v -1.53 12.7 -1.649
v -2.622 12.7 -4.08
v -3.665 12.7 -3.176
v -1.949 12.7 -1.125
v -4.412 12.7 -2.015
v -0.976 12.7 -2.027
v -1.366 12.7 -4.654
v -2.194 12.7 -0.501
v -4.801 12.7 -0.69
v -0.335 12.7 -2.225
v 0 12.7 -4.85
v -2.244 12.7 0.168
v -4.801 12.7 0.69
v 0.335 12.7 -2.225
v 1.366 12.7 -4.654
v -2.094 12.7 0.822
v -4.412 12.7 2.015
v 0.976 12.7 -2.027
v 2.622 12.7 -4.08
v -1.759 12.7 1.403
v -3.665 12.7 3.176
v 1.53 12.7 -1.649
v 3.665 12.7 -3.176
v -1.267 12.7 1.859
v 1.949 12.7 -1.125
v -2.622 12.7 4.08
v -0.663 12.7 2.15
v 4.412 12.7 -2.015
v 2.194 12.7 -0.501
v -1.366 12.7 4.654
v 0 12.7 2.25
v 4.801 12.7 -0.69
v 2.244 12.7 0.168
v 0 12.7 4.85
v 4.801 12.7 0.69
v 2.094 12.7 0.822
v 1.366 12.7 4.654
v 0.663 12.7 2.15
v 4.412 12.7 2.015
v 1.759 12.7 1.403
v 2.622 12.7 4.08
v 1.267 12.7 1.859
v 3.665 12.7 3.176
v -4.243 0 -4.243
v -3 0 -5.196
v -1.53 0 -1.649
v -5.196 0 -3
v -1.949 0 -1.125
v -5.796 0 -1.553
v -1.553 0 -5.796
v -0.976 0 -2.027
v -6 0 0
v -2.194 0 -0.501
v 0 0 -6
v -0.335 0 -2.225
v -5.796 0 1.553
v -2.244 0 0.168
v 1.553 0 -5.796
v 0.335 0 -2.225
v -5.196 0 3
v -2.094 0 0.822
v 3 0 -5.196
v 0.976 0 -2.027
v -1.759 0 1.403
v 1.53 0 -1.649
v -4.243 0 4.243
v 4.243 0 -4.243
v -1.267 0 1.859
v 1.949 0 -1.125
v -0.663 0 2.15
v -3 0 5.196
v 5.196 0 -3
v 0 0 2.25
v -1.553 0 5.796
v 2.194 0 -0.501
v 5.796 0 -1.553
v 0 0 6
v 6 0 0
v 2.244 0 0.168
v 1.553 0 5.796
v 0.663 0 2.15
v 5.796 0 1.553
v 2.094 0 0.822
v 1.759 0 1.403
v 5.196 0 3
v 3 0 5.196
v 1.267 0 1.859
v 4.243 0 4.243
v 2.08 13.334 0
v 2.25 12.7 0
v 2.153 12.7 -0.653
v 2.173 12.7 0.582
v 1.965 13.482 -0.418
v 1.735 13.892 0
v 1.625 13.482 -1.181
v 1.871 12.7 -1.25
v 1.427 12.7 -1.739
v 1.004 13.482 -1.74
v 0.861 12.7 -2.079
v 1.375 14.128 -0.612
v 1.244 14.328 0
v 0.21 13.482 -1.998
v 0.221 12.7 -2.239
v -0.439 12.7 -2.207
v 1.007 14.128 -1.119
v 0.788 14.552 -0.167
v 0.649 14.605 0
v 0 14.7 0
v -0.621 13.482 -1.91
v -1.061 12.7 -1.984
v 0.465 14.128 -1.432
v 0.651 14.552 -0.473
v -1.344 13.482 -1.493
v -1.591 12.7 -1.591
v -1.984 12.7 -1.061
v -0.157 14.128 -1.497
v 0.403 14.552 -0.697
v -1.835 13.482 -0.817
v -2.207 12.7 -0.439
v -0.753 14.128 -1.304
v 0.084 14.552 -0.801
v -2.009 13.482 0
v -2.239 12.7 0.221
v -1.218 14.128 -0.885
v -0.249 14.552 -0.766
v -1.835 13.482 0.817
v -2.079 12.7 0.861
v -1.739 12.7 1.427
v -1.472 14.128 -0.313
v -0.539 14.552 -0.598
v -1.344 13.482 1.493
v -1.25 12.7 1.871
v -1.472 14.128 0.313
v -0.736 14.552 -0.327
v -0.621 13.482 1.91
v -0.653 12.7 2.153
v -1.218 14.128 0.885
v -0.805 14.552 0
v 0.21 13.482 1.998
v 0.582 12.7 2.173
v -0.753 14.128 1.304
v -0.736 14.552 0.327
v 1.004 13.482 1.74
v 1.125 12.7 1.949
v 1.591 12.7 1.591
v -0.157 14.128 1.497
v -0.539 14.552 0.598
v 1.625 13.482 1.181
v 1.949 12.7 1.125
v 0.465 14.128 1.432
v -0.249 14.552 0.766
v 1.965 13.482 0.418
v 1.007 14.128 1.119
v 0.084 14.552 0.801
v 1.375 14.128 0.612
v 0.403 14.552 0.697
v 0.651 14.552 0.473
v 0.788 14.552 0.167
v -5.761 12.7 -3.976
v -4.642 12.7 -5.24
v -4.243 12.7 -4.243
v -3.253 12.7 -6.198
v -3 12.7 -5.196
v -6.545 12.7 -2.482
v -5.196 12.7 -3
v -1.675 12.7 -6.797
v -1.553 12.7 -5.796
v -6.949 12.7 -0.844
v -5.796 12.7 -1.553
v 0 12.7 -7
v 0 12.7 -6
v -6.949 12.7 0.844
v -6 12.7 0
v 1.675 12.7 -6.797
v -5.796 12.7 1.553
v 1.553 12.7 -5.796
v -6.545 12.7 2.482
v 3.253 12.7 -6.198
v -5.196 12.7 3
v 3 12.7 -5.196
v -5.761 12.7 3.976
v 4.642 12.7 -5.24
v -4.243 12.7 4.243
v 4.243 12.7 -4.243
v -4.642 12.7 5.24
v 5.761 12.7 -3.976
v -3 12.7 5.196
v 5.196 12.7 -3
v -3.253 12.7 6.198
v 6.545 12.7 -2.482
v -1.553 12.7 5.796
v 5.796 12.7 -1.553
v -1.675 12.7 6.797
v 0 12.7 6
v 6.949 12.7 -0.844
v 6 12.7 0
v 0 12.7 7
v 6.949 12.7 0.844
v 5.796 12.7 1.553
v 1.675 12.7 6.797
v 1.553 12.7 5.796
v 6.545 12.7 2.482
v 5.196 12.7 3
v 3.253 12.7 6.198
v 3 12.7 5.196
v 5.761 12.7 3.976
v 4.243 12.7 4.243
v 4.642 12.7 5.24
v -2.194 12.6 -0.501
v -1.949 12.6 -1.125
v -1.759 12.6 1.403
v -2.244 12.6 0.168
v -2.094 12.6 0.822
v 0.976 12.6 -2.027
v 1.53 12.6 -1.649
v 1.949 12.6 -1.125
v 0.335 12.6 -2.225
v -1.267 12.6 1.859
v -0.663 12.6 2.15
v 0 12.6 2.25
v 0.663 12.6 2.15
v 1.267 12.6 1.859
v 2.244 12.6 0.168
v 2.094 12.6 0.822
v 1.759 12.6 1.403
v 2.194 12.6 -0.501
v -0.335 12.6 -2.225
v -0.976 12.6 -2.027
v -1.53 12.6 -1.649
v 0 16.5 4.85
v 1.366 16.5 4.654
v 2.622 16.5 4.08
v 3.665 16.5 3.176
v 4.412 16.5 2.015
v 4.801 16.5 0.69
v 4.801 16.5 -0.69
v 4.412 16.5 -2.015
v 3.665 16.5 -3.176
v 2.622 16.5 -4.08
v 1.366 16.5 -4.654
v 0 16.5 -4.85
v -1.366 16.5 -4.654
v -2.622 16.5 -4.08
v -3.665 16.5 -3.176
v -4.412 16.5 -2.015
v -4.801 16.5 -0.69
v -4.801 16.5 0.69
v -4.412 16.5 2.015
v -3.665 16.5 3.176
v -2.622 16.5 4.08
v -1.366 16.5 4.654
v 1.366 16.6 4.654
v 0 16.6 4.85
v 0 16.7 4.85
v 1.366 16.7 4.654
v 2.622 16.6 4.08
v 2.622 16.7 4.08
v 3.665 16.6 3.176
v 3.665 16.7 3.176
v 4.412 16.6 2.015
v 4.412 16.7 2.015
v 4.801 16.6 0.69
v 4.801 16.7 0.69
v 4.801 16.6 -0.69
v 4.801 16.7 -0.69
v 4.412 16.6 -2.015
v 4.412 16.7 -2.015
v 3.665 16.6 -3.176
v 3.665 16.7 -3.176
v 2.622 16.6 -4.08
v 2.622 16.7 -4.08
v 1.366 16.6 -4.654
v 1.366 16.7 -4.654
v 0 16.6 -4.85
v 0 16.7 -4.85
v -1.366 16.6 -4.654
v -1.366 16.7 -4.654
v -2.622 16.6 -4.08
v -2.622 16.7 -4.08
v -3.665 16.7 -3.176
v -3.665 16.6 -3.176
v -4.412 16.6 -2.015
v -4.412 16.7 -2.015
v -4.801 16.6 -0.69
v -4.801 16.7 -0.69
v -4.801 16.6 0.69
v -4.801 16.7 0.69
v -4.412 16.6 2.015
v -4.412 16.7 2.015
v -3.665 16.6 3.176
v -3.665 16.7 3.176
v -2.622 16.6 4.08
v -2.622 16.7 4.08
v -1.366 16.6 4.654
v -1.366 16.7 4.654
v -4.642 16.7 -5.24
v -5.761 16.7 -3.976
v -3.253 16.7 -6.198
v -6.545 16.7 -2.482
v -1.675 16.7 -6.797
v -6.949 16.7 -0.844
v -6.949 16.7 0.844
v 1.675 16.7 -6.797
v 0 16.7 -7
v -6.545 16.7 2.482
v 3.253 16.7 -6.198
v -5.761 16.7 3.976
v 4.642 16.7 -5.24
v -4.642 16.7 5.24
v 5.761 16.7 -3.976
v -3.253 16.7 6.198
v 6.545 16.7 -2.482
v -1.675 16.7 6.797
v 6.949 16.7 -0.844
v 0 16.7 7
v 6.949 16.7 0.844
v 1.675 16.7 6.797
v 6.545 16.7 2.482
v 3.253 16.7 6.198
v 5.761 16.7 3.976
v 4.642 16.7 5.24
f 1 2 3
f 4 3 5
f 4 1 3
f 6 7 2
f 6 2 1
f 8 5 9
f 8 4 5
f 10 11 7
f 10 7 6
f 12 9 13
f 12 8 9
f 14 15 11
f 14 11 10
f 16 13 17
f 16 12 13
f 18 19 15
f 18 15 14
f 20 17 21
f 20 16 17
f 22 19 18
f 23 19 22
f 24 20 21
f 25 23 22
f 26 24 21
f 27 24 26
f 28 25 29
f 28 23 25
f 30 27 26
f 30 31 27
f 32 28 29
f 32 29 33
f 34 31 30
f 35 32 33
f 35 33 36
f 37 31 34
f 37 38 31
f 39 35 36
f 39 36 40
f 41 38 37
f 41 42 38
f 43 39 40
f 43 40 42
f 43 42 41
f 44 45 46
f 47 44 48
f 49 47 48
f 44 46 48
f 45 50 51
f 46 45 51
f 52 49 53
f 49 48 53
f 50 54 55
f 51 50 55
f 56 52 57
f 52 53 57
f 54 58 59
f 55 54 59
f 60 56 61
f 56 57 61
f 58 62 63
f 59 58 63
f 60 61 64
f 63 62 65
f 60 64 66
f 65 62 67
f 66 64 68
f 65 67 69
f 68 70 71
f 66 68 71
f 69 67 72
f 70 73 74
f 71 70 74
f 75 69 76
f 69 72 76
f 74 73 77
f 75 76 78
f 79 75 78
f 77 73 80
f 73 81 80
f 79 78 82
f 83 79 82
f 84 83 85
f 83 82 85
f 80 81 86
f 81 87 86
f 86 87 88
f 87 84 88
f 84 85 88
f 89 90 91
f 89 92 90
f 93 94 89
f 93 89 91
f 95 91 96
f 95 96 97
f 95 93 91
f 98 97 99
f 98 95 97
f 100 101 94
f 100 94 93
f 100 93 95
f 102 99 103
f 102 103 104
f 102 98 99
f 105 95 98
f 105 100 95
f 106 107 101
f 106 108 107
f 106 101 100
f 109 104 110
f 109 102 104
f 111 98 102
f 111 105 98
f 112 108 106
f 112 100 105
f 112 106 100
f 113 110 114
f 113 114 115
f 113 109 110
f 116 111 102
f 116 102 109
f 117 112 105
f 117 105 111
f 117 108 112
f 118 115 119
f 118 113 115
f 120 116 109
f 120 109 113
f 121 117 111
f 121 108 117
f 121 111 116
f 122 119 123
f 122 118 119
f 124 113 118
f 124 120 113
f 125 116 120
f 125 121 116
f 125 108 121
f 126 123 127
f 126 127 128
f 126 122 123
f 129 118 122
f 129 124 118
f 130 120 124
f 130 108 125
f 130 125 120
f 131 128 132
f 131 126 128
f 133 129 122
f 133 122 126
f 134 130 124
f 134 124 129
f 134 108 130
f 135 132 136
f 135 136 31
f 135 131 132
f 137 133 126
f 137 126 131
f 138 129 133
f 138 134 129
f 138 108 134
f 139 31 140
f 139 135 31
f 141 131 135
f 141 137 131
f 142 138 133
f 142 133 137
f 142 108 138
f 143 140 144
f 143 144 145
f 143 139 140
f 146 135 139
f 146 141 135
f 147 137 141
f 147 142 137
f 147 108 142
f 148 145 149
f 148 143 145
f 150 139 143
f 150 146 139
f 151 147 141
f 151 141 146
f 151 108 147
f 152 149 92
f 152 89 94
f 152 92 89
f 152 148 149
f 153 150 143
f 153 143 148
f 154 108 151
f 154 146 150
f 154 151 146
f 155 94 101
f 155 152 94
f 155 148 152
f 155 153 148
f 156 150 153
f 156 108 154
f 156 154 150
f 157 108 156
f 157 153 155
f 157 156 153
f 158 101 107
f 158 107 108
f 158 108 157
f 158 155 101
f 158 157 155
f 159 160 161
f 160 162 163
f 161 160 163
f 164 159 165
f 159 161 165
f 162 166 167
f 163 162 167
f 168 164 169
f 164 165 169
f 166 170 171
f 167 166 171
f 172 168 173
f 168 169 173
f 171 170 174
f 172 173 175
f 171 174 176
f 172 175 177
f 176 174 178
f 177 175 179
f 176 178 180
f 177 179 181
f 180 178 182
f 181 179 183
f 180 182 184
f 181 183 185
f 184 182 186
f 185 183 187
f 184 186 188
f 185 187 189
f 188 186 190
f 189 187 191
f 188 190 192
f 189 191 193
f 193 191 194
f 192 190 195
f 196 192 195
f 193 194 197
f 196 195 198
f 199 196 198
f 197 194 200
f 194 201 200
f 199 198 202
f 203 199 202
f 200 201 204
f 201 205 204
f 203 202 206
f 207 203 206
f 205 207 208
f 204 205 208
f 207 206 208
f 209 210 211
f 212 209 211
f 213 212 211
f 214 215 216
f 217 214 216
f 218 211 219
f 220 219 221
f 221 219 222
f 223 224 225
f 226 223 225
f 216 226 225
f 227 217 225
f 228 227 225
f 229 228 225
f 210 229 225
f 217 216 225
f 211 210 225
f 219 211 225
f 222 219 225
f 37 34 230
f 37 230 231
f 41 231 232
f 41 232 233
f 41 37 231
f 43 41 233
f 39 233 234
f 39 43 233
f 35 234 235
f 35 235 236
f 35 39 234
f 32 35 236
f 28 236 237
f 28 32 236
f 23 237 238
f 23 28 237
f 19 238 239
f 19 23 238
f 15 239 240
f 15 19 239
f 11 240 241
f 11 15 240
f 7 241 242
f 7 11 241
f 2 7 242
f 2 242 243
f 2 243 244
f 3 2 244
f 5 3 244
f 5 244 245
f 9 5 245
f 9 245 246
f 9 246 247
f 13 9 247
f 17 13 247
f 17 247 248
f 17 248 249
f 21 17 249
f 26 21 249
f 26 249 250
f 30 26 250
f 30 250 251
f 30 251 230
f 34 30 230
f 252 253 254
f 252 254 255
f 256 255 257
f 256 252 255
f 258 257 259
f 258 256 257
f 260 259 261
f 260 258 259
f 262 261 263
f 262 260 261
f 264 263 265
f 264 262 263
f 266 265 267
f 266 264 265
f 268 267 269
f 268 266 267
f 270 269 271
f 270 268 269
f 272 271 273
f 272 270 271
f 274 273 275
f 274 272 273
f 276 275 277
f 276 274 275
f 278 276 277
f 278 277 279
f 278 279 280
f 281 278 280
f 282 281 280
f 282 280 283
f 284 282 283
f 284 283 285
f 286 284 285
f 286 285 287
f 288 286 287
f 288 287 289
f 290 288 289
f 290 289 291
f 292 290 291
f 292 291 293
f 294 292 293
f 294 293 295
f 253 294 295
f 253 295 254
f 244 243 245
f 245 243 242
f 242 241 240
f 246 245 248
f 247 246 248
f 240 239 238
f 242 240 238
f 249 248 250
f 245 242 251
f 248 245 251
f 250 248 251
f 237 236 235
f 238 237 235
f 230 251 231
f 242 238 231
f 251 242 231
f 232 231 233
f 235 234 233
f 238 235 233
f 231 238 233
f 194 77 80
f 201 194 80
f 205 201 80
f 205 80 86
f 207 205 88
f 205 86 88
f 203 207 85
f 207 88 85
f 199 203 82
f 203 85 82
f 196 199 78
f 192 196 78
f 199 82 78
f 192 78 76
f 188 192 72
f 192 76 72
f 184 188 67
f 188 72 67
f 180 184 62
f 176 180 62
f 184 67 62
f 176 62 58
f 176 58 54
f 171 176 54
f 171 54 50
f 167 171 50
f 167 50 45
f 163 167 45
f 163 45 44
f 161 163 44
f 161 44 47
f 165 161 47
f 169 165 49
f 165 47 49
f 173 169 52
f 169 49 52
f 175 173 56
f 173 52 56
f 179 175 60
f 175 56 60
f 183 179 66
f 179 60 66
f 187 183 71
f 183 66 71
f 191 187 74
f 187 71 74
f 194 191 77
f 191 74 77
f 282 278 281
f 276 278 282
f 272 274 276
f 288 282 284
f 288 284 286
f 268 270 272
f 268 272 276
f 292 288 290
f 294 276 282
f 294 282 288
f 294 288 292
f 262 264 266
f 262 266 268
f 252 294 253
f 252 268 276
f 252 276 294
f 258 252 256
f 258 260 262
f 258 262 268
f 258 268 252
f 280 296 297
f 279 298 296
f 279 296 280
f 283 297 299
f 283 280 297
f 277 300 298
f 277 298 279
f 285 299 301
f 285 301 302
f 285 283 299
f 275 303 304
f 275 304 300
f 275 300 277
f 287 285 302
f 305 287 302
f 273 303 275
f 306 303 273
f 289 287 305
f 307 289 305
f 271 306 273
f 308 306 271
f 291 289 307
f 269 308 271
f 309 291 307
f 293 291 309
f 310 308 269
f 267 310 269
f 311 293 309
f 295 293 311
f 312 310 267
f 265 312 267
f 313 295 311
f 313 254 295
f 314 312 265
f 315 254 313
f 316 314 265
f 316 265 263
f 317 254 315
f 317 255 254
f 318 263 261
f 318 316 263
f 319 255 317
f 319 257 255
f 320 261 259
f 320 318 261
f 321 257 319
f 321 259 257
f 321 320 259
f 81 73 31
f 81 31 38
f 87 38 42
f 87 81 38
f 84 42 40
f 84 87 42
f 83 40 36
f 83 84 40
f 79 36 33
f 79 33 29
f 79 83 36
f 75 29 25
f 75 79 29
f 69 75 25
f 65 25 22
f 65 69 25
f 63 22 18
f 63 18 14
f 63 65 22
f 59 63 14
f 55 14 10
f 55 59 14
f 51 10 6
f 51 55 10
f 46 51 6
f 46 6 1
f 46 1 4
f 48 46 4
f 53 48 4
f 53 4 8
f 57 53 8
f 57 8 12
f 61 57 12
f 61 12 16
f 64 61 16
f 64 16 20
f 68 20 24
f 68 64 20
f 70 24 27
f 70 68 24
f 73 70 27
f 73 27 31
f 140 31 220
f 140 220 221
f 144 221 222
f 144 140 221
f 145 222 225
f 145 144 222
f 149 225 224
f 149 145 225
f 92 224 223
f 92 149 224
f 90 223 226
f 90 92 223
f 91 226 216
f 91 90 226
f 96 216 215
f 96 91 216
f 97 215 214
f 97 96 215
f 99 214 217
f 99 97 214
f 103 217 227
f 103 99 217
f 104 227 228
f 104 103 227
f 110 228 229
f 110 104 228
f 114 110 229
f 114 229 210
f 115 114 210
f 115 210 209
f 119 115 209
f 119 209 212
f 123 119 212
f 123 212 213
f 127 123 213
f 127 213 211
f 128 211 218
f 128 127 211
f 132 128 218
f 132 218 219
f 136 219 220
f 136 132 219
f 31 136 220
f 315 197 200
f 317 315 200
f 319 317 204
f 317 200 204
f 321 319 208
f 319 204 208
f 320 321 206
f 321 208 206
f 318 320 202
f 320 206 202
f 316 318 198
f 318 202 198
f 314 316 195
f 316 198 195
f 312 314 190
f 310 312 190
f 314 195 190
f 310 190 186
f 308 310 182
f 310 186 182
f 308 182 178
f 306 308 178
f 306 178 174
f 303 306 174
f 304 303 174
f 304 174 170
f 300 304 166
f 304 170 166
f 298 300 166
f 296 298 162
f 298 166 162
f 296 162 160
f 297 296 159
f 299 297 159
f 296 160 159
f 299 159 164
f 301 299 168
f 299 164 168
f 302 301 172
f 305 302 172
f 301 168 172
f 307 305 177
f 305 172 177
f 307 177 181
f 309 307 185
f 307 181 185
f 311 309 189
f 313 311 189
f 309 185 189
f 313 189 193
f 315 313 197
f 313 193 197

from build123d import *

# Parameters (mm, degrees)
SKETCH1_R           = 6
SKETCH1_R_2         = 2.25
BOSS_EXTRUDE1_DEPTH = 12.7
SKETCH2_R           = 7
SKETCH2_R_2         = 6
SKETCH2_R_3         = 4.85
BOSS_EXTRUDE2_DEPTH = 4
BOSS_EXTRUDE3_START = 3.8
SKETCH2_2_R         = 4.85
BOSS_EXTRUDE3_DEPTH = 0.1
SKETCH2_6_R         = 2.25
BOSS_EXTRUDE4_DEPTH = 0.1


# Read off the part's stored shape, not the designer's step: Dome1
with BuildPart() as part:
    # Sketch1 → Boss-Extrude1 (new body)
    with BuildSketch(Plane(origin=(0, 0, 0), x_dir=(1, 0, 0), z_dir=(0, 1, 0))):
        with Locations(Location((0, 0, 0), (0, 0, 270))):
            Circle(SKETCH1_R)
        with Locations(Location((0, 0, 0), (0, 0, 270))):
            Circle(SKETCH1_R_2, mode=Mode.SUBTRACT)
    extrude(amount=BOSS_EXTRUDE1_DEPTH)

    # Sketch2 → Boss-Extrude2 (add)
    # profile 1 of 2: a face of its own
    with BuildSketch(Plane(origin=(0, 12.7, 0), x_dir=(1, 0, 0), z_dir=(0, 1, 0))):
        with Locations(Location((0, 0, 0), (0, 0, 270))):
            Circle(SKETCH2_R)
        with Locations(Location((0, 0, 0), (0, 0, 270))):
            Circle(SKETCH2_R_2, mode=Mode.SUBTRACT)
    # profile 2 of 2: a face of its own
    with BuildSketch(Plane(origin=(0, 12.7, 0), x_dir=(1, 0, 0), z_dir=(0, 1, 0))):
        with Locations(Location((0, 0, 0), (0, 0, 270))):
            Circle(SKETCH2_R_2)
        with Locations(Location((0, 0, 0), (0, 0, 270))):
            Circle(SKETCH2_R_3, mode=Mode.SUBTRACT)
    extrude(amount=BOSS_EXTRUDE2_DEPTH)

    # Sketch2<2> → Boss-Extrude3 (add)
    with BuildSketch(Plane(origin=(0, 12.7, 0), x_dir=(1, 0, 0), z_dir=(0, 1, 0)).offset(BOSS_EXTRUDE3_START)):
        with Locations(Location((0, 0, 0), (0, 0, 270))):
            Circle(SKETCH2_2_R)
    extrude(amount=BOSS_EXTRUDE3_DEPTH)


with BuildPart() as body_2:
    # Sketch2<6> → Boss-Extrude4 (new body)
    with BuildSketch(Plane(origin=(0, 12.7, 0), x_dir=(1, 0, 0), z_dir=(0, 1, 0))):
        with Locations(Location((0, 0, 0), (0, 0, 270))):
            Circle(SKETCH2_6_R)
    extrude(amount=-BOSS_EXTRUDE4_DEPTH)

    # Dome1 outline → Dome1 (revolve)
    with BuildSketch(Plane.XY):
        with BuildLine():
            Line((0, 12.7), (2.25, 12.699999998))
            ThreePointArc((2.25, 12.699999998), (1.505199323, 14.127724237), (0, 14.7))
            Line((0, 14.7), (0, 12.7))
        make_face()
    revolve(axis=Axis((0, 0, 0), (0, 1, 0)))


solid = Compound([part.part, body_2.part])
